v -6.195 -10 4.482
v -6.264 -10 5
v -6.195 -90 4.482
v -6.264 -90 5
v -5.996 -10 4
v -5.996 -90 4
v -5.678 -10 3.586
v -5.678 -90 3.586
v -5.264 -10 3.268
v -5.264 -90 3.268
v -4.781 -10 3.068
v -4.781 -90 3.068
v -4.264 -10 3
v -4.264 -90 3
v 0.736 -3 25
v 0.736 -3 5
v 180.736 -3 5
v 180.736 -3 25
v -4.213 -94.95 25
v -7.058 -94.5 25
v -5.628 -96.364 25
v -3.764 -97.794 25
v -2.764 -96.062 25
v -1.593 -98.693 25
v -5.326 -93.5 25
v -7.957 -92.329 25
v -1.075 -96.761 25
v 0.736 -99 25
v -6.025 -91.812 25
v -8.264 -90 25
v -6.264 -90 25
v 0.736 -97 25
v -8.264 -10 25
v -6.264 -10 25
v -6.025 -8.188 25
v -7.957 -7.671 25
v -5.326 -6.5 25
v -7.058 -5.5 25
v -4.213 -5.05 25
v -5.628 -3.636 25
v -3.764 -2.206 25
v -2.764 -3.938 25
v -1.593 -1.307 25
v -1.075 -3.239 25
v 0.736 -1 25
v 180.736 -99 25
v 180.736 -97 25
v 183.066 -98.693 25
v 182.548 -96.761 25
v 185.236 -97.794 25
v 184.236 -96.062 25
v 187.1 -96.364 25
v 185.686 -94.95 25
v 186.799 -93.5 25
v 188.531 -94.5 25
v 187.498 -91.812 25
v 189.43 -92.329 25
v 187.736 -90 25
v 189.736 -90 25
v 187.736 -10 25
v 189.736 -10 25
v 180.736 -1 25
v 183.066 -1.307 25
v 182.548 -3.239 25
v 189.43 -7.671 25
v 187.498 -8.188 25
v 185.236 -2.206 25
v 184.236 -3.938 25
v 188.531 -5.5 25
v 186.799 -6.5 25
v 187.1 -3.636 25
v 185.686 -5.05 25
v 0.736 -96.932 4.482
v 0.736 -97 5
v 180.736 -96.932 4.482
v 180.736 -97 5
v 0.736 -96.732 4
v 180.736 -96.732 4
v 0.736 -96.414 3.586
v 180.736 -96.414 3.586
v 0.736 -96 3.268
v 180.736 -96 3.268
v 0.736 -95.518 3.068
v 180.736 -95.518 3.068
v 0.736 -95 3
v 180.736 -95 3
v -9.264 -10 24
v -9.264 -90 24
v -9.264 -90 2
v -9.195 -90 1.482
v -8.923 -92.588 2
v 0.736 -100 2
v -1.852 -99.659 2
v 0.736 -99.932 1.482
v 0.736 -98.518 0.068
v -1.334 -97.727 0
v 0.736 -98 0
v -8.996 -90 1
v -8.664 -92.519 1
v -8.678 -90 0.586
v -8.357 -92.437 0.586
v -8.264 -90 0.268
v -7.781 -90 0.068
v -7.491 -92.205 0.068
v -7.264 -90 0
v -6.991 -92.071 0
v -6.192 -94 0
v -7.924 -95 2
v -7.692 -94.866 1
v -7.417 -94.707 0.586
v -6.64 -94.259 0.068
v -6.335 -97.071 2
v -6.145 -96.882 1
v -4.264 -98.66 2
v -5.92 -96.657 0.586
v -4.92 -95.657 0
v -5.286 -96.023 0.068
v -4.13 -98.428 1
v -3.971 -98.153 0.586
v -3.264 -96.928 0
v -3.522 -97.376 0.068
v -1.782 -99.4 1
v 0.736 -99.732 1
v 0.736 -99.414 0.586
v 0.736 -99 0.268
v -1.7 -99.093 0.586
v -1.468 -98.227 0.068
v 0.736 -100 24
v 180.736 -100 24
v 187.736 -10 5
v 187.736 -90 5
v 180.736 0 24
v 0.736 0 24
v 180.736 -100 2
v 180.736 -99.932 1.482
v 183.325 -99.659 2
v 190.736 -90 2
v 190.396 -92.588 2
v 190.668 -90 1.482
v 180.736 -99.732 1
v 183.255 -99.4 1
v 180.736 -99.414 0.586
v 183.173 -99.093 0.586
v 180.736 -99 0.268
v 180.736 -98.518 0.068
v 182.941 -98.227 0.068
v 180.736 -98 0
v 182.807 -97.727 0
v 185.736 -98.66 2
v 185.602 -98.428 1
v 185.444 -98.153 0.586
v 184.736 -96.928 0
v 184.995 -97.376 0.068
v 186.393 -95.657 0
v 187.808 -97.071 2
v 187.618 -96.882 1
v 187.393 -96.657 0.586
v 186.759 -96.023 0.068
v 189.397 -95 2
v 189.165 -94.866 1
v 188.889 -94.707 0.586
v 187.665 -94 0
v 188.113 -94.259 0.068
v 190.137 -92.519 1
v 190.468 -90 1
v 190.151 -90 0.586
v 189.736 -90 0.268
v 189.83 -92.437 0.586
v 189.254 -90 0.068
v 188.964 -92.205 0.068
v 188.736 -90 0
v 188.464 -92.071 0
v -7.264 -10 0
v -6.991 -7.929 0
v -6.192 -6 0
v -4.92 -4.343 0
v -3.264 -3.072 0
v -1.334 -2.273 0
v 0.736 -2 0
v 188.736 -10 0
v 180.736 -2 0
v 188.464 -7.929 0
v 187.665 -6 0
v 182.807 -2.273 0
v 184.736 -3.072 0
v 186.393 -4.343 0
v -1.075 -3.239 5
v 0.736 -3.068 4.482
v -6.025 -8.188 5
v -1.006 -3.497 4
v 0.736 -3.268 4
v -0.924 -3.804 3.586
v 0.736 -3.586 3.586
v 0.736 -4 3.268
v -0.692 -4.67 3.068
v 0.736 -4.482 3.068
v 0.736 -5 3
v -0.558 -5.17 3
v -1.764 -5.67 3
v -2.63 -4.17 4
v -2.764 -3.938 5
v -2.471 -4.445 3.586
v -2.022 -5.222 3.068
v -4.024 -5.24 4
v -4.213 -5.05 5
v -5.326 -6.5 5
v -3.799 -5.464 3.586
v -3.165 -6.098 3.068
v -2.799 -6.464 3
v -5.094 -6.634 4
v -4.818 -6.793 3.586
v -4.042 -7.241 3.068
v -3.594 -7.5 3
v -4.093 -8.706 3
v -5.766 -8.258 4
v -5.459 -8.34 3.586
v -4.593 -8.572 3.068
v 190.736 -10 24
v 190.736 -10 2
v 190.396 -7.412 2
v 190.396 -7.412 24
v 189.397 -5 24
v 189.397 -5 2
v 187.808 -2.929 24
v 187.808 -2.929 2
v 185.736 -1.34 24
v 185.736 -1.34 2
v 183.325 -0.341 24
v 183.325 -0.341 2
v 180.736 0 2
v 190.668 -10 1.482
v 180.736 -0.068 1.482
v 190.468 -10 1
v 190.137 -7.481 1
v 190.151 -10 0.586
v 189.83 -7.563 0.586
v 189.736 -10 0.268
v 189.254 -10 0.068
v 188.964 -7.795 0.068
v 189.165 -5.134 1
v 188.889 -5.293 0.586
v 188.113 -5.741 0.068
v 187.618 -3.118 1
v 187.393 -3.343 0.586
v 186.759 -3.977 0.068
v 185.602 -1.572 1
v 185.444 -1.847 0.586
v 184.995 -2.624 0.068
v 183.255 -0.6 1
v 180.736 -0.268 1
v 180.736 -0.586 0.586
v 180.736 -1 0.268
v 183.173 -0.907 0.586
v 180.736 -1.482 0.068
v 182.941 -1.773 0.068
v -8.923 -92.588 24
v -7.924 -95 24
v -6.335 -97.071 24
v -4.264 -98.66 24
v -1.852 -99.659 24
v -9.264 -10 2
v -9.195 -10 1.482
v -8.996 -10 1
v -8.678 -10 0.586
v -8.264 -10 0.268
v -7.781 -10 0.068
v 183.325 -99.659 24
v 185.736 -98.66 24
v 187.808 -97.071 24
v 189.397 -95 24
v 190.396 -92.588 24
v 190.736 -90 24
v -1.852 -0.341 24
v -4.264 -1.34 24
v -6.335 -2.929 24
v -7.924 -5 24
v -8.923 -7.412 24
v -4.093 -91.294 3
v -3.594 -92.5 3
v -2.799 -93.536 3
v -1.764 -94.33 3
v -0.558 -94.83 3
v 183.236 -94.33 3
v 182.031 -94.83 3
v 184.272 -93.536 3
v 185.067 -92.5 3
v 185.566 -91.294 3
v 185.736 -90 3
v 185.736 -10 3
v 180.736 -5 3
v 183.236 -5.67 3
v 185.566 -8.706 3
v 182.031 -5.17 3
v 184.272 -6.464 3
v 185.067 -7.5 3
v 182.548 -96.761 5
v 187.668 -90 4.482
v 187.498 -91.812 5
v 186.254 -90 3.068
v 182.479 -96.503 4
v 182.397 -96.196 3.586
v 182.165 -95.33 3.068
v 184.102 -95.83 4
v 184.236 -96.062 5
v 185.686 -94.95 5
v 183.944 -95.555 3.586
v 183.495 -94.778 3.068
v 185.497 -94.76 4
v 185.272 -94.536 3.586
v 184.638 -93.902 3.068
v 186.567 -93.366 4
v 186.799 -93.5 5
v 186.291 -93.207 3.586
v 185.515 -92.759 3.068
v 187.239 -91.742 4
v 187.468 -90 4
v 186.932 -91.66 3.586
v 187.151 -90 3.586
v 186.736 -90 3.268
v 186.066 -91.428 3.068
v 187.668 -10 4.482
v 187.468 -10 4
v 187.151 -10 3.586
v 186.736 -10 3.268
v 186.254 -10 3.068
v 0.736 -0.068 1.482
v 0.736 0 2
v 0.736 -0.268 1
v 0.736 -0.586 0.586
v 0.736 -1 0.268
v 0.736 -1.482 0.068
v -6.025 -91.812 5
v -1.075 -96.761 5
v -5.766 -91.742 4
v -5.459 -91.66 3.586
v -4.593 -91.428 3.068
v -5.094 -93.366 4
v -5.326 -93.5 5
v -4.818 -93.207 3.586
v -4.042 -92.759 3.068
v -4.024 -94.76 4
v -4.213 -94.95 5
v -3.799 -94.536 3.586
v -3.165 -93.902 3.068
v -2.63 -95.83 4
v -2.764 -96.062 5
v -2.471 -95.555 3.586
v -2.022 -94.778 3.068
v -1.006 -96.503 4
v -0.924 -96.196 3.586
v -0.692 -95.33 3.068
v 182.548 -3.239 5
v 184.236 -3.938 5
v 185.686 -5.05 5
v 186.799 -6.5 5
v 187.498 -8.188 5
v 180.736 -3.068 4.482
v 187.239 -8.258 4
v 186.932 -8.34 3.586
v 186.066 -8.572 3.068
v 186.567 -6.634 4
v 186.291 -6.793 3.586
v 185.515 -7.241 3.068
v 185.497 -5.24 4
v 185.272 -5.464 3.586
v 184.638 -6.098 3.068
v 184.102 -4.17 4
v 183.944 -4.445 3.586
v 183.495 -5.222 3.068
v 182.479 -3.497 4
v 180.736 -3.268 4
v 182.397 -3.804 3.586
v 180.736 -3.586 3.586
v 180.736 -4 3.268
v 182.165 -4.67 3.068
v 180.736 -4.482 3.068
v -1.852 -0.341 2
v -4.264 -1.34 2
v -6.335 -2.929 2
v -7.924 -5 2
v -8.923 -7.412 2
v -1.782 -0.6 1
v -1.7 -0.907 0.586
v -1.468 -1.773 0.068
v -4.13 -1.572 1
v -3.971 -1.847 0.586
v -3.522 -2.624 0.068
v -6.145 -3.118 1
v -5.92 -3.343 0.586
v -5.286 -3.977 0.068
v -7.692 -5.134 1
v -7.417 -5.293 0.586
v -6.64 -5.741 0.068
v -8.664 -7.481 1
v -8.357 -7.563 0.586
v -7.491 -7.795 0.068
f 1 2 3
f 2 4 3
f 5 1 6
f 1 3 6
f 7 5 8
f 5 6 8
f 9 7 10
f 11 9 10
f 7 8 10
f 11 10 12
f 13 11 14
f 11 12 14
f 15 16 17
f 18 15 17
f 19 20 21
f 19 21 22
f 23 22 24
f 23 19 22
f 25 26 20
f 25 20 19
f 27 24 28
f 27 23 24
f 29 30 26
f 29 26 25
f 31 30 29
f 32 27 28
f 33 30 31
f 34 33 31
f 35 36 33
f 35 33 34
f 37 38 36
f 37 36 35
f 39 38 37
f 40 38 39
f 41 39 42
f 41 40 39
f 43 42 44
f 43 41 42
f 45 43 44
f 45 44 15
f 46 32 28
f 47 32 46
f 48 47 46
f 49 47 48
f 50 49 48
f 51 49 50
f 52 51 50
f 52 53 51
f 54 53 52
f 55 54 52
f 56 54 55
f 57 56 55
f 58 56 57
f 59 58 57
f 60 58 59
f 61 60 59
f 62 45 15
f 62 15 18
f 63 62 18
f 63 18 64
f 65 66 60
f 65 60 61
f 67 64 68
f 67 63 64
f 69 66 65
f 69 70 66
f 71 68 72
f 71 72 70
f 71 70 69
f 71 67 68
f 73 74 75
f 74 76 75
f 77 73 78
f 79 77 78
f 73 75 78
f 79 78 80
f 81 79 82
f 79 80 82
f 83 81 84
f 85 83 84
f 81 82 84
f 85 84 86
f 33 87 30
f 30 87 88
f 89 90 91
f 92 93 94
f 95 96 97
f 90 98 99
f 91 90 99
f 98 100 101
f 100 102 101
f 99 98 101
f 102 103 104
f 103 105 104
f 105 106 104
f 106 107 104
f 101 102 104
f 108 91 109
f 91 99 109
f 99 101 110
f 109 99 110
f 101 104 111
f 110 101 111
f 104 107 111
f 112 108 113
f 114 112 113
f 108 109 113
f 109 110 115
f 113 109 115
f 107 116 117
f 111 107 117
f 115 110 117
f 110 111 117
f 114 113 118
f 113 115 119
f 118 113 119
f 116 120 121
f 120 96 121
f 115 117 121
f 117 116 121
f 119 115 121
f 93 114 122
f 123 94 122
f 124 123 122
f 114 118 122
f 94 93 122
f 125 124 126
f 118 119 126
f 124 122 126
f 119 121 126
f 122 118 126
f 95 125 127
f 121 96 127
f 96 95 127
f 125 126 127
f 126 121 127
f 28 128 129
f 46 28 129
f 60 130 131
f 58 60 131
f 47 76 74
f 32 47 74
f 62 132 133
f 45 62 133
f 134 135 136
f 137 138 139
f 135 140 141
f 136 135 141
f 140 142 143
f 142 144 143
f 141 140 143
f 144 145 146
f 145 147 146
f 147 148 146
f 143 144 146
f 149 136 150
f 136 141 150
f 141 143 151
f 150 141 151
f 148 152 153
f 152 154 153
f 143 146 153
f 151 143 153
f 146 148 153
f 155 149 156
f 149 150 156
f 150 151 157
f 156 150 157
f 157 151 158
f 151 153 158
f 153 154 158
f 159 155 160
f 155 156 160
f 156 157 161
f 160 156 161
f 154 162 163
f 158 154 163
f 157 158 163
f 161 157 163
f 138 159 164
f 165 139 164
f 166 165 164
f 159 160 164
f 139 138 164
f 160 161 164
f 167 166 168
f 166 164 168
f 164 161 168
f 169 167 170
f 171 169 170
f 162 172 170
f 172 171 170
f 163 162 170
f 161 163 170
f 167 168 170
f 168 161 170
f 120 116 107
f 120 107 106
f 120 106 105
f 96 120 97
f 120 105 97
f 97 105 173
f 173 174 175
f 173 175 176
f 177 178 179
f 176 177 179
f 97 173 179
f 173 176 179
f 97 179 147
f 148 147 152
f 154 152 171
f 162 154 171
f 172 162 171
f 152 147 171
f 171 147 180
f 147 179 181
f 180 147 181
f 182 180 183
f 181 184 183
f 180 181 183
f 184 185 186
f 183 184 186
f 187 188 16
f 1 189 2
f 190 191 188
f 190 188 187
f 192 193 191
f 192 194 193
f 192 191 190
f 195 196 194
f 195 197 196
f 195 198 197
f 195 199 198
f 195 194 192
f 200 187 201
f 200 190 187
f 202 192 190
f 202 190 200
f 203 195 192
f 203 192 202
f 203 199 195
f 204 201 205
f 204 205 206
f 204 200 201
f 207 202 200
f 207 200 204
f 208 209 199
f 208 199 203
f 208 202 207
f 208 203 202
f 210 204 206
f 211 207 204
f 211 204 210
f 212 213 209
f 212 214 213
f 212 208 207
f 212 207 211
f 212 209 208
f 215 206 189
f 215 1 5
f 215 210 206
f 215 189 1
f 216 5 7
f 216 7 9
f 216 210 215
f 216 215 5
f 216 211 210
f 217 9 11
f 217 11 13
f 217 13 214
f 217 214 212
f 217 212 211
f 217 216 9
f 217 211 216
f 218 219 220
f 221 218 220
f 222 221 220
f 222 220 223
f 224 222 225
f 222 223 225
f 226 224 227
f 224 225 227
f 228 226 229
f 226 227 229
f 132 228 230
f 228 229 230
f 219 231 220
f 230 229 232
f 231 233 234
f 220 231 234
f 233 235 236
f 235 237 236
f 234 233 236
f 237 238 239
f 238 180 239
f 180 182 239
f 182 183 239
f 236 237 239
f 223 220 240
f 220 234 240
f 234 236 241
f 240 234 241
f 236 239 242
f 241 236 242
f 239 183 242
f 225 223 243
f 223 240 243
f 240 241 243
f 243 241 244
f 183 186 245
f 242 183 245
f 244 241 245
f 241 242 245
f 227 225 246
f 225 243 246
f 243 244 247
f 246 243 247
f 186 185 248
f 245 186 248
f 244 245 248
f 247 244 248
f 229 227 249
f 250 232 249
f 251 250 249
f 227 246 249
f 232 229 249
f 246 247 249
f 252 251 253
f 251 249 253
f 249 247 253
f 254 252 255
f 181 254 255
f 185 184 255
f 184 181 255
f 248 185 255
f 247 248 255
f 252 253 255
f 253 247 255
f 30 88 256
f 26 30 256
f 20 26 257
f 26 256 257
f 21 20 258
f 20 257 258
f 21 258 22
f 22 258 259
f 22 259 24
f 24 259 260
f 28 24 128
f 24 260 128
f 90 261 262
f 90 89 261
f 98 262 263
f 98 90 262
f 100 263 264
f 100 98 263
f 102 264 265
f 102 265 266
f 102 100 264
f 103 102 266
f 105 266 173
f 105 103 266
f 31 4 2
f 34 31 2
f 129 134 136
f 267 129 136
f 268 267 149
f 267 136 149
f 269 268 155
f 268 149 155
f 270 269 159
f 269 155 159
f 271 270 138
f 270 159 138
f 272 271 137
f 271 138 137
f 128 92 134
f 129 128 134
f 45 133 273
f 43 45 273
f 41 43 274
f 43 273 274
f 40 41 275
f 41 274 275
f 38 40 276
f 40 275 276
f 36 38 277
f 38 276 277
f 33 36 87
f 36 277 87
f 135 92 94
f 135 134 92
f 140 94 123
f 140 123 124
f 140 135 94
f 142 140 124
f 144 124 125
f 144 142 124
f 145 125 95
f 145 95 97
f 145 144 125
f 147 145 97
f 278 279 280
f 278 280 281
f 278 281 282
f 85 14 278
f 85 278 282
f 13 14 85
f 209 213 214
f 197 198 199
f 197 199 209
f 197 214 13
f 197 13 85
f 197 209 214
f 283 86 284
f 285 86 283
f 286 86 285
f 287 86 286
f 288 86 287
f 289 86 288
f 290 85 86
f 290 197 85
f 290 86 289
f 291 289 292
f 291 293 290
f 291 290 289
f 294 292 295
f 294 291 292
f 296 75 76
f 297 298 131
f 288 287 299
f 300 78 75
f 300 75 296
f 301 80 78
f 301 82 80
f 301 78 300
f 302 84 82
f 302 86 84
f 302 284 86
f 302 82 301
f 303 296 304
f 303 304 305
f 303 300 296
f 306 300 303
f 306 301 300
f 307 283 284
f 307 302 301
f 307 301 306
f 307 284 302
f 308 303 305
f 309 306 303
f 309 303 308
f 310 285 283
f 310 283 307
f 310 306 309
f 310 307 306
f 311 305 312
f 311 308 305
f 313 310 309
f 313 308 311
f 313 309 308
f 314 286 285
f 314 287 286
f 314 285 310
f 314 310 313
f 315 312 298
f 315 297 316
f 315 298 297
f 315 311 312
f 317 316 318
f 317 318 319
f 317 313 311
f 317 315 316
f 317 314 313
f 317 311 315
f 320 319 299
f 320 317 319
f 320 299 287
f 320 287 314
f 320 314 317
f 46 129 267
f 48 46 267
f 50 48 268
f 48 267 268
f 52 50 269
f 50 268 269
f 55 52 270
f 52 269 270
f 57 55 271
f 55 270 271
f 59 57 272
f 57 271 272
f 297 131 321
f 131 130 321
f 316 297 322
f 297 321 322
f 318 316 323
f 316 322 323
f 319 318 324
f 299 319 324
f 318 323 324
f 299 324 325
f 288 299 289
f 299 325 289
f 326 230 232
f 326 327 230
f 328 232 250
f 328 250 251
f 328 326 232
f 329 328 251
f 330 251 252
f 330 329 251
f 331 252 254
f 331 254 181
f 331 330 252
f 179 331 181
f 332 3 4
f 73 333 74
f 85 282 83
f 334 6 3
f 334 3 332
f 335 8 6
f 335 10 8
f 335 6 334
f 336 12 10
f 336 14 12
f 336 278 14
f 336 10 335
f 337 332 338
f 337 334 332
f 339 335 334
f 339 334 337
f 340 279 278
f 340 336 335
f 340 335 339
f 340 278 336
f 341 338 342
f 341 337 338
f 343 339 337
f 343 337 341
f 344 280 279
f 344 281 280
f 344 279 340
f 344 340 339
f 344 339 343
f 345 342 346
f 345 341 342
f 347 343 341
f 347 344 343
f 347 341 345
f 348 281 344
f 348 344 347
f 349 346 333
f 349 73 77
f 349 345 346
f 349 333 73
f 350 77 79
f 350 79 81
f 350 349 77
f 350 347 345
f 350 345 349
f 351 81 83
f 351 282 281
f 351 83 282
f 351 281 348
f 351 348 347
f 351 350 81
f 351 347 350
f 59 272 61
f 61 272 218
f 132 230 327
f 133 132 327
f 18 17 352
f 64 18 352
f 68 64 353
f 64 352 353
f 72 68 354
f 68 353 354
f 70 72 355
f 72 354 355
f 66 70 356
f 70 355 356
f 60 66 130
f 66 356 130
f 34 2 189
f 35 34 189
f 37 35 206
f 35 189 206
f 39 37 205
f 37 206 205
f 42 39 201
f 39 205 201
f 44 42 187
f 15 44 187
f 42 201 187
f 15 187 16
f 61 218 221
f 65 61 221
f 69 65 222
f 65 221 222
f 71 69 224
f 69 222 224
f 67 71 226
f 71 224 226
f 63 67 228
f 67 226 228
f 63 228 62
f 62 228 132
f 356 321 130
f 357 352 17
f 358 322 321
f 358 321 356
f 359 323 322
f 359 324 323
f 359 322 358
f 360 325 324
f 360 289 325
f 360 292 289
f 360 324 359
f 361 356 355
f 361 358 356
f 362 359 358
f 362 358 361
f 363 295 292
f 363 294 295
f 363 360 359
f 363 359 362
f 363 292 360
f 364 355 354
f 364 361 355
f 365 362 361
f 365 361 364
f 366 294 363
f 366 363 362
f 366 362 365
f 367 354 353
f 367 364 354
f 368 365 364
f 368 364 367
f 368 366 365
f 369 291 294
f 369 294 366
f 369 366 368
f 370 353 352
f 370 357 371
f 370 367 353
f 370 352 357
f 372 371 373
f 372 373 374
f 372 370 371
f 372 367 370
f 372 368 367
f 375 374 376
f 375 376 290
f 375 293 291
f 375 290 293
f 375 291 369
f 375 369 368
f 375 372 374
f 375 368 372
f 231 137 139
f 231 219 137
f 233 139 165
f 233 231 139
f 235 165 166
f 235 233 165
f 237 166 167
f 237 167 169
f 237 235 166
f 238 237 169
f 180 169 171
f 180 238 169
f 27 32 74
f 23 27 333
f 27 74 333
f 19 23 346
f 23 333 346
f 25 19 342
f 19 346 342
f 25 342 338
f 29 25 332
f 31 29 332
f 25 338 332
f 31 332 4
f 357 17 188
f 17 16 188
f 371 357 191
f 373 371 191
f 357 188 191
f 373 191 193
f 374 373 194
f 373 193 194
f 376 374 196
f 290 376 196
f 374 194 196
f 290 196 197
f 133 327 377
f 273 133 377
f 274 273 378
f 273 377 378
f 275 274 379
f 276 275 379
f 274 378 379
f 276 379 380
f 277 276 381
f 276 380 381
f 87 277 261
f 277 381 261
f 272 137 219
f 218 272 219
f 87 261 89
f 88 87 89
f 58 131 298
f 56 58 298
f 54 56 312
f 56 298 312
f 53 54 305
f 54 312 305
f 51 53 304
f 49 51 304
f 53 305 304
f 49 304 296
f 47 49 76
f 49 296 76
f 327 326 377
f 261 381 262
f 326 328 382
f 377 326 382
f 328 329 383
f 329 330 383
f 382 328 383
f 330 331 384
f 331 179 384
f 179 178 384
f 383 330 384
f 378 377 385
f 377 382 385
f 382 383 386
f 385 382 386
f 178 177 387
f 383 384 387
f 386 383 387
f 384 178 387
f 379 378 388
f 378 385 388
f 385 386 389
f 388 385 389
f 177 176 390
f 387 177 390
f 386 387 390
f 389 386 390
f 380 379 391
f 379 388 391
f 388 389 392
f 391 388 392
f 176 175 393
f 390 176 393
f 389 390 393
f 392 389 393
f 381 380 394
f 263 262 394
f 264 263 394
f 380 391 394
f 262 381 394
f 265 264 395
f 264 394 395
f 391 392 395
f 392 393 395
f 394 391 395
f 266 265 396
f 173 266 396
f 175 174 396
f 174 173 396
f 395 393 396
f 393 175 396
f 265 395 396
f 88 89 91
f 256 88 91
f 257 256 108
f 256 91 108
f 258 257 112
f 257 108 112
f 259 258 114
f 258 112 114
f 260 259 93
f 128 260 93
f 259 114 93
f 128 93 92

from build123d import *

# Parameters (mm, degrees)
F1_DEPTH = 25
F2_DEPTH = 3
F3_R     = 2
F4_R     = 2
F5_SIZE  = 1


with BuildPart() as f1:
    # F0 (on Top) → F1 (new body)
    with BuildSketch(Plane.XY):
        with BuildLine():
            Line((180.736435, 0), (0.736435, 0))
            ThreePointArc((0.736435, 0), (-6.334633, -2.928932), (-9.263565, -10))
            Line((-9.263565, -10), (-9.263565, -90))
            ThreePointArc((-9.263565, -90), (-6.334633, -97.071068), (0.736435, -100))
            Line((0.736435, -100), (180.736435, -100))
            ThreePointArc((180.736435, -100), (187.807502, -97.071068), (190.736435, -90))
            Line((190.736435, -90), (190.736435, -10))
            ThreePointArc((190.736435, -10), (187.807502, -2.928932), (180.736435, 0))
        make_face()
        with BuildLine():
            ThreePointArc((-6.263565, -10), (-4.213313, -5.050253), (0.736435, -3))
            Line((0.736435, -3), (180.736435, -3))
            ThreePointArc((180.736435, -3), (185.686182, -5.050253), (187.736435, -10))
            Line((187.736435, -10), (187.736435, -90))
            ThreePointArc((187.736435, -90), (185.686182, -94.949747), (180.736435, -97))
            Line((180.736435, -97), (0.736435, -97))
            ThreePointArc((0.736435, -97), (-4.213313, -94.949747), (-6.263565, -90))
            Line((-6.263565, -90), (-6.263565, -10))
        make_face(mode=Mode.SUBTRACT)
    extrude(amount=F1_DEPTH)

    # F0 (on Top) → F2 (join)
    with BuildSketch(Plane.XY):
        with BuildLine():
            Line((180.736435, -3), (0.736435, -3))
            ThreePointArc((0.736435, -3), (-4.213313, -5.050253), (-6.263565, -10))
            Line((-6.263565, -10), (-6.263565, -90))
            ThreePointArc((-6.263565, -90), (-4.213313, -94.949747), (0.736435, -97))
            Line((0.736435, -97), (180.736435, -97))
            ThreePointArc((180.736435, -97), (185.686182, -94.949747), (187.736435, -90))
            Line((187.736435, -90), (187.736435, -10))
            ThreePointArc((187.736435, -10), (185.686182, -5.050253), (180.736435, -3))
        make_face()
    extrude(amount=F2_DEPTH)

    # F3
    f3_edges = [f1.edges().sort_by_distance(p)[0] for p in [
        (-6.263565, -50, 3),
        (-4.213313, -5.050253, 3),
        (90.736435, -3, 3),
        (-4.213313, -94.949747, 3),
        (90.736435, -97, 3),
        (185.686182, -94.949747, 3),
        (187.736435, -50, 3),
        (185.686182, -5.050253, 3),
    ]]
    fillet(f3_edges, radius=F3_R)

    # F4
    f4_edges = [f1.edges().sort_by_distance(p)[0] for p in [
        (90.736435, -100, 0),
        (187.807502, -2.928932, 0),
        (90.736435, 0, 0),
        (-6.334633, -2.928932, 0),
        (-9.263565, -50, 0),
        (-6.334633, -97.071068, 0),
        (187.807502, -97.071068, 0),
        (190.736435, -50, 0),
    ]]
    fillet(f4_edges, radius=F4_R)

    # F5
    f5_edges = [f1.edges().sort_by_distance(p)[0] for p in [
        (-9.263565, -50, 25),
        (-6.334633, -97.071068, 25),
        (90.736435, -100, 25),
        (187.807502, -97.071068, 25),
        (190.736435, -50, 25),
        (187.807502, -2.928932, 25),
        (90.736435, 0, 25),
    ]]
    chamfer(f5_edges, length=F5_SIZE)


solid = f1.part
